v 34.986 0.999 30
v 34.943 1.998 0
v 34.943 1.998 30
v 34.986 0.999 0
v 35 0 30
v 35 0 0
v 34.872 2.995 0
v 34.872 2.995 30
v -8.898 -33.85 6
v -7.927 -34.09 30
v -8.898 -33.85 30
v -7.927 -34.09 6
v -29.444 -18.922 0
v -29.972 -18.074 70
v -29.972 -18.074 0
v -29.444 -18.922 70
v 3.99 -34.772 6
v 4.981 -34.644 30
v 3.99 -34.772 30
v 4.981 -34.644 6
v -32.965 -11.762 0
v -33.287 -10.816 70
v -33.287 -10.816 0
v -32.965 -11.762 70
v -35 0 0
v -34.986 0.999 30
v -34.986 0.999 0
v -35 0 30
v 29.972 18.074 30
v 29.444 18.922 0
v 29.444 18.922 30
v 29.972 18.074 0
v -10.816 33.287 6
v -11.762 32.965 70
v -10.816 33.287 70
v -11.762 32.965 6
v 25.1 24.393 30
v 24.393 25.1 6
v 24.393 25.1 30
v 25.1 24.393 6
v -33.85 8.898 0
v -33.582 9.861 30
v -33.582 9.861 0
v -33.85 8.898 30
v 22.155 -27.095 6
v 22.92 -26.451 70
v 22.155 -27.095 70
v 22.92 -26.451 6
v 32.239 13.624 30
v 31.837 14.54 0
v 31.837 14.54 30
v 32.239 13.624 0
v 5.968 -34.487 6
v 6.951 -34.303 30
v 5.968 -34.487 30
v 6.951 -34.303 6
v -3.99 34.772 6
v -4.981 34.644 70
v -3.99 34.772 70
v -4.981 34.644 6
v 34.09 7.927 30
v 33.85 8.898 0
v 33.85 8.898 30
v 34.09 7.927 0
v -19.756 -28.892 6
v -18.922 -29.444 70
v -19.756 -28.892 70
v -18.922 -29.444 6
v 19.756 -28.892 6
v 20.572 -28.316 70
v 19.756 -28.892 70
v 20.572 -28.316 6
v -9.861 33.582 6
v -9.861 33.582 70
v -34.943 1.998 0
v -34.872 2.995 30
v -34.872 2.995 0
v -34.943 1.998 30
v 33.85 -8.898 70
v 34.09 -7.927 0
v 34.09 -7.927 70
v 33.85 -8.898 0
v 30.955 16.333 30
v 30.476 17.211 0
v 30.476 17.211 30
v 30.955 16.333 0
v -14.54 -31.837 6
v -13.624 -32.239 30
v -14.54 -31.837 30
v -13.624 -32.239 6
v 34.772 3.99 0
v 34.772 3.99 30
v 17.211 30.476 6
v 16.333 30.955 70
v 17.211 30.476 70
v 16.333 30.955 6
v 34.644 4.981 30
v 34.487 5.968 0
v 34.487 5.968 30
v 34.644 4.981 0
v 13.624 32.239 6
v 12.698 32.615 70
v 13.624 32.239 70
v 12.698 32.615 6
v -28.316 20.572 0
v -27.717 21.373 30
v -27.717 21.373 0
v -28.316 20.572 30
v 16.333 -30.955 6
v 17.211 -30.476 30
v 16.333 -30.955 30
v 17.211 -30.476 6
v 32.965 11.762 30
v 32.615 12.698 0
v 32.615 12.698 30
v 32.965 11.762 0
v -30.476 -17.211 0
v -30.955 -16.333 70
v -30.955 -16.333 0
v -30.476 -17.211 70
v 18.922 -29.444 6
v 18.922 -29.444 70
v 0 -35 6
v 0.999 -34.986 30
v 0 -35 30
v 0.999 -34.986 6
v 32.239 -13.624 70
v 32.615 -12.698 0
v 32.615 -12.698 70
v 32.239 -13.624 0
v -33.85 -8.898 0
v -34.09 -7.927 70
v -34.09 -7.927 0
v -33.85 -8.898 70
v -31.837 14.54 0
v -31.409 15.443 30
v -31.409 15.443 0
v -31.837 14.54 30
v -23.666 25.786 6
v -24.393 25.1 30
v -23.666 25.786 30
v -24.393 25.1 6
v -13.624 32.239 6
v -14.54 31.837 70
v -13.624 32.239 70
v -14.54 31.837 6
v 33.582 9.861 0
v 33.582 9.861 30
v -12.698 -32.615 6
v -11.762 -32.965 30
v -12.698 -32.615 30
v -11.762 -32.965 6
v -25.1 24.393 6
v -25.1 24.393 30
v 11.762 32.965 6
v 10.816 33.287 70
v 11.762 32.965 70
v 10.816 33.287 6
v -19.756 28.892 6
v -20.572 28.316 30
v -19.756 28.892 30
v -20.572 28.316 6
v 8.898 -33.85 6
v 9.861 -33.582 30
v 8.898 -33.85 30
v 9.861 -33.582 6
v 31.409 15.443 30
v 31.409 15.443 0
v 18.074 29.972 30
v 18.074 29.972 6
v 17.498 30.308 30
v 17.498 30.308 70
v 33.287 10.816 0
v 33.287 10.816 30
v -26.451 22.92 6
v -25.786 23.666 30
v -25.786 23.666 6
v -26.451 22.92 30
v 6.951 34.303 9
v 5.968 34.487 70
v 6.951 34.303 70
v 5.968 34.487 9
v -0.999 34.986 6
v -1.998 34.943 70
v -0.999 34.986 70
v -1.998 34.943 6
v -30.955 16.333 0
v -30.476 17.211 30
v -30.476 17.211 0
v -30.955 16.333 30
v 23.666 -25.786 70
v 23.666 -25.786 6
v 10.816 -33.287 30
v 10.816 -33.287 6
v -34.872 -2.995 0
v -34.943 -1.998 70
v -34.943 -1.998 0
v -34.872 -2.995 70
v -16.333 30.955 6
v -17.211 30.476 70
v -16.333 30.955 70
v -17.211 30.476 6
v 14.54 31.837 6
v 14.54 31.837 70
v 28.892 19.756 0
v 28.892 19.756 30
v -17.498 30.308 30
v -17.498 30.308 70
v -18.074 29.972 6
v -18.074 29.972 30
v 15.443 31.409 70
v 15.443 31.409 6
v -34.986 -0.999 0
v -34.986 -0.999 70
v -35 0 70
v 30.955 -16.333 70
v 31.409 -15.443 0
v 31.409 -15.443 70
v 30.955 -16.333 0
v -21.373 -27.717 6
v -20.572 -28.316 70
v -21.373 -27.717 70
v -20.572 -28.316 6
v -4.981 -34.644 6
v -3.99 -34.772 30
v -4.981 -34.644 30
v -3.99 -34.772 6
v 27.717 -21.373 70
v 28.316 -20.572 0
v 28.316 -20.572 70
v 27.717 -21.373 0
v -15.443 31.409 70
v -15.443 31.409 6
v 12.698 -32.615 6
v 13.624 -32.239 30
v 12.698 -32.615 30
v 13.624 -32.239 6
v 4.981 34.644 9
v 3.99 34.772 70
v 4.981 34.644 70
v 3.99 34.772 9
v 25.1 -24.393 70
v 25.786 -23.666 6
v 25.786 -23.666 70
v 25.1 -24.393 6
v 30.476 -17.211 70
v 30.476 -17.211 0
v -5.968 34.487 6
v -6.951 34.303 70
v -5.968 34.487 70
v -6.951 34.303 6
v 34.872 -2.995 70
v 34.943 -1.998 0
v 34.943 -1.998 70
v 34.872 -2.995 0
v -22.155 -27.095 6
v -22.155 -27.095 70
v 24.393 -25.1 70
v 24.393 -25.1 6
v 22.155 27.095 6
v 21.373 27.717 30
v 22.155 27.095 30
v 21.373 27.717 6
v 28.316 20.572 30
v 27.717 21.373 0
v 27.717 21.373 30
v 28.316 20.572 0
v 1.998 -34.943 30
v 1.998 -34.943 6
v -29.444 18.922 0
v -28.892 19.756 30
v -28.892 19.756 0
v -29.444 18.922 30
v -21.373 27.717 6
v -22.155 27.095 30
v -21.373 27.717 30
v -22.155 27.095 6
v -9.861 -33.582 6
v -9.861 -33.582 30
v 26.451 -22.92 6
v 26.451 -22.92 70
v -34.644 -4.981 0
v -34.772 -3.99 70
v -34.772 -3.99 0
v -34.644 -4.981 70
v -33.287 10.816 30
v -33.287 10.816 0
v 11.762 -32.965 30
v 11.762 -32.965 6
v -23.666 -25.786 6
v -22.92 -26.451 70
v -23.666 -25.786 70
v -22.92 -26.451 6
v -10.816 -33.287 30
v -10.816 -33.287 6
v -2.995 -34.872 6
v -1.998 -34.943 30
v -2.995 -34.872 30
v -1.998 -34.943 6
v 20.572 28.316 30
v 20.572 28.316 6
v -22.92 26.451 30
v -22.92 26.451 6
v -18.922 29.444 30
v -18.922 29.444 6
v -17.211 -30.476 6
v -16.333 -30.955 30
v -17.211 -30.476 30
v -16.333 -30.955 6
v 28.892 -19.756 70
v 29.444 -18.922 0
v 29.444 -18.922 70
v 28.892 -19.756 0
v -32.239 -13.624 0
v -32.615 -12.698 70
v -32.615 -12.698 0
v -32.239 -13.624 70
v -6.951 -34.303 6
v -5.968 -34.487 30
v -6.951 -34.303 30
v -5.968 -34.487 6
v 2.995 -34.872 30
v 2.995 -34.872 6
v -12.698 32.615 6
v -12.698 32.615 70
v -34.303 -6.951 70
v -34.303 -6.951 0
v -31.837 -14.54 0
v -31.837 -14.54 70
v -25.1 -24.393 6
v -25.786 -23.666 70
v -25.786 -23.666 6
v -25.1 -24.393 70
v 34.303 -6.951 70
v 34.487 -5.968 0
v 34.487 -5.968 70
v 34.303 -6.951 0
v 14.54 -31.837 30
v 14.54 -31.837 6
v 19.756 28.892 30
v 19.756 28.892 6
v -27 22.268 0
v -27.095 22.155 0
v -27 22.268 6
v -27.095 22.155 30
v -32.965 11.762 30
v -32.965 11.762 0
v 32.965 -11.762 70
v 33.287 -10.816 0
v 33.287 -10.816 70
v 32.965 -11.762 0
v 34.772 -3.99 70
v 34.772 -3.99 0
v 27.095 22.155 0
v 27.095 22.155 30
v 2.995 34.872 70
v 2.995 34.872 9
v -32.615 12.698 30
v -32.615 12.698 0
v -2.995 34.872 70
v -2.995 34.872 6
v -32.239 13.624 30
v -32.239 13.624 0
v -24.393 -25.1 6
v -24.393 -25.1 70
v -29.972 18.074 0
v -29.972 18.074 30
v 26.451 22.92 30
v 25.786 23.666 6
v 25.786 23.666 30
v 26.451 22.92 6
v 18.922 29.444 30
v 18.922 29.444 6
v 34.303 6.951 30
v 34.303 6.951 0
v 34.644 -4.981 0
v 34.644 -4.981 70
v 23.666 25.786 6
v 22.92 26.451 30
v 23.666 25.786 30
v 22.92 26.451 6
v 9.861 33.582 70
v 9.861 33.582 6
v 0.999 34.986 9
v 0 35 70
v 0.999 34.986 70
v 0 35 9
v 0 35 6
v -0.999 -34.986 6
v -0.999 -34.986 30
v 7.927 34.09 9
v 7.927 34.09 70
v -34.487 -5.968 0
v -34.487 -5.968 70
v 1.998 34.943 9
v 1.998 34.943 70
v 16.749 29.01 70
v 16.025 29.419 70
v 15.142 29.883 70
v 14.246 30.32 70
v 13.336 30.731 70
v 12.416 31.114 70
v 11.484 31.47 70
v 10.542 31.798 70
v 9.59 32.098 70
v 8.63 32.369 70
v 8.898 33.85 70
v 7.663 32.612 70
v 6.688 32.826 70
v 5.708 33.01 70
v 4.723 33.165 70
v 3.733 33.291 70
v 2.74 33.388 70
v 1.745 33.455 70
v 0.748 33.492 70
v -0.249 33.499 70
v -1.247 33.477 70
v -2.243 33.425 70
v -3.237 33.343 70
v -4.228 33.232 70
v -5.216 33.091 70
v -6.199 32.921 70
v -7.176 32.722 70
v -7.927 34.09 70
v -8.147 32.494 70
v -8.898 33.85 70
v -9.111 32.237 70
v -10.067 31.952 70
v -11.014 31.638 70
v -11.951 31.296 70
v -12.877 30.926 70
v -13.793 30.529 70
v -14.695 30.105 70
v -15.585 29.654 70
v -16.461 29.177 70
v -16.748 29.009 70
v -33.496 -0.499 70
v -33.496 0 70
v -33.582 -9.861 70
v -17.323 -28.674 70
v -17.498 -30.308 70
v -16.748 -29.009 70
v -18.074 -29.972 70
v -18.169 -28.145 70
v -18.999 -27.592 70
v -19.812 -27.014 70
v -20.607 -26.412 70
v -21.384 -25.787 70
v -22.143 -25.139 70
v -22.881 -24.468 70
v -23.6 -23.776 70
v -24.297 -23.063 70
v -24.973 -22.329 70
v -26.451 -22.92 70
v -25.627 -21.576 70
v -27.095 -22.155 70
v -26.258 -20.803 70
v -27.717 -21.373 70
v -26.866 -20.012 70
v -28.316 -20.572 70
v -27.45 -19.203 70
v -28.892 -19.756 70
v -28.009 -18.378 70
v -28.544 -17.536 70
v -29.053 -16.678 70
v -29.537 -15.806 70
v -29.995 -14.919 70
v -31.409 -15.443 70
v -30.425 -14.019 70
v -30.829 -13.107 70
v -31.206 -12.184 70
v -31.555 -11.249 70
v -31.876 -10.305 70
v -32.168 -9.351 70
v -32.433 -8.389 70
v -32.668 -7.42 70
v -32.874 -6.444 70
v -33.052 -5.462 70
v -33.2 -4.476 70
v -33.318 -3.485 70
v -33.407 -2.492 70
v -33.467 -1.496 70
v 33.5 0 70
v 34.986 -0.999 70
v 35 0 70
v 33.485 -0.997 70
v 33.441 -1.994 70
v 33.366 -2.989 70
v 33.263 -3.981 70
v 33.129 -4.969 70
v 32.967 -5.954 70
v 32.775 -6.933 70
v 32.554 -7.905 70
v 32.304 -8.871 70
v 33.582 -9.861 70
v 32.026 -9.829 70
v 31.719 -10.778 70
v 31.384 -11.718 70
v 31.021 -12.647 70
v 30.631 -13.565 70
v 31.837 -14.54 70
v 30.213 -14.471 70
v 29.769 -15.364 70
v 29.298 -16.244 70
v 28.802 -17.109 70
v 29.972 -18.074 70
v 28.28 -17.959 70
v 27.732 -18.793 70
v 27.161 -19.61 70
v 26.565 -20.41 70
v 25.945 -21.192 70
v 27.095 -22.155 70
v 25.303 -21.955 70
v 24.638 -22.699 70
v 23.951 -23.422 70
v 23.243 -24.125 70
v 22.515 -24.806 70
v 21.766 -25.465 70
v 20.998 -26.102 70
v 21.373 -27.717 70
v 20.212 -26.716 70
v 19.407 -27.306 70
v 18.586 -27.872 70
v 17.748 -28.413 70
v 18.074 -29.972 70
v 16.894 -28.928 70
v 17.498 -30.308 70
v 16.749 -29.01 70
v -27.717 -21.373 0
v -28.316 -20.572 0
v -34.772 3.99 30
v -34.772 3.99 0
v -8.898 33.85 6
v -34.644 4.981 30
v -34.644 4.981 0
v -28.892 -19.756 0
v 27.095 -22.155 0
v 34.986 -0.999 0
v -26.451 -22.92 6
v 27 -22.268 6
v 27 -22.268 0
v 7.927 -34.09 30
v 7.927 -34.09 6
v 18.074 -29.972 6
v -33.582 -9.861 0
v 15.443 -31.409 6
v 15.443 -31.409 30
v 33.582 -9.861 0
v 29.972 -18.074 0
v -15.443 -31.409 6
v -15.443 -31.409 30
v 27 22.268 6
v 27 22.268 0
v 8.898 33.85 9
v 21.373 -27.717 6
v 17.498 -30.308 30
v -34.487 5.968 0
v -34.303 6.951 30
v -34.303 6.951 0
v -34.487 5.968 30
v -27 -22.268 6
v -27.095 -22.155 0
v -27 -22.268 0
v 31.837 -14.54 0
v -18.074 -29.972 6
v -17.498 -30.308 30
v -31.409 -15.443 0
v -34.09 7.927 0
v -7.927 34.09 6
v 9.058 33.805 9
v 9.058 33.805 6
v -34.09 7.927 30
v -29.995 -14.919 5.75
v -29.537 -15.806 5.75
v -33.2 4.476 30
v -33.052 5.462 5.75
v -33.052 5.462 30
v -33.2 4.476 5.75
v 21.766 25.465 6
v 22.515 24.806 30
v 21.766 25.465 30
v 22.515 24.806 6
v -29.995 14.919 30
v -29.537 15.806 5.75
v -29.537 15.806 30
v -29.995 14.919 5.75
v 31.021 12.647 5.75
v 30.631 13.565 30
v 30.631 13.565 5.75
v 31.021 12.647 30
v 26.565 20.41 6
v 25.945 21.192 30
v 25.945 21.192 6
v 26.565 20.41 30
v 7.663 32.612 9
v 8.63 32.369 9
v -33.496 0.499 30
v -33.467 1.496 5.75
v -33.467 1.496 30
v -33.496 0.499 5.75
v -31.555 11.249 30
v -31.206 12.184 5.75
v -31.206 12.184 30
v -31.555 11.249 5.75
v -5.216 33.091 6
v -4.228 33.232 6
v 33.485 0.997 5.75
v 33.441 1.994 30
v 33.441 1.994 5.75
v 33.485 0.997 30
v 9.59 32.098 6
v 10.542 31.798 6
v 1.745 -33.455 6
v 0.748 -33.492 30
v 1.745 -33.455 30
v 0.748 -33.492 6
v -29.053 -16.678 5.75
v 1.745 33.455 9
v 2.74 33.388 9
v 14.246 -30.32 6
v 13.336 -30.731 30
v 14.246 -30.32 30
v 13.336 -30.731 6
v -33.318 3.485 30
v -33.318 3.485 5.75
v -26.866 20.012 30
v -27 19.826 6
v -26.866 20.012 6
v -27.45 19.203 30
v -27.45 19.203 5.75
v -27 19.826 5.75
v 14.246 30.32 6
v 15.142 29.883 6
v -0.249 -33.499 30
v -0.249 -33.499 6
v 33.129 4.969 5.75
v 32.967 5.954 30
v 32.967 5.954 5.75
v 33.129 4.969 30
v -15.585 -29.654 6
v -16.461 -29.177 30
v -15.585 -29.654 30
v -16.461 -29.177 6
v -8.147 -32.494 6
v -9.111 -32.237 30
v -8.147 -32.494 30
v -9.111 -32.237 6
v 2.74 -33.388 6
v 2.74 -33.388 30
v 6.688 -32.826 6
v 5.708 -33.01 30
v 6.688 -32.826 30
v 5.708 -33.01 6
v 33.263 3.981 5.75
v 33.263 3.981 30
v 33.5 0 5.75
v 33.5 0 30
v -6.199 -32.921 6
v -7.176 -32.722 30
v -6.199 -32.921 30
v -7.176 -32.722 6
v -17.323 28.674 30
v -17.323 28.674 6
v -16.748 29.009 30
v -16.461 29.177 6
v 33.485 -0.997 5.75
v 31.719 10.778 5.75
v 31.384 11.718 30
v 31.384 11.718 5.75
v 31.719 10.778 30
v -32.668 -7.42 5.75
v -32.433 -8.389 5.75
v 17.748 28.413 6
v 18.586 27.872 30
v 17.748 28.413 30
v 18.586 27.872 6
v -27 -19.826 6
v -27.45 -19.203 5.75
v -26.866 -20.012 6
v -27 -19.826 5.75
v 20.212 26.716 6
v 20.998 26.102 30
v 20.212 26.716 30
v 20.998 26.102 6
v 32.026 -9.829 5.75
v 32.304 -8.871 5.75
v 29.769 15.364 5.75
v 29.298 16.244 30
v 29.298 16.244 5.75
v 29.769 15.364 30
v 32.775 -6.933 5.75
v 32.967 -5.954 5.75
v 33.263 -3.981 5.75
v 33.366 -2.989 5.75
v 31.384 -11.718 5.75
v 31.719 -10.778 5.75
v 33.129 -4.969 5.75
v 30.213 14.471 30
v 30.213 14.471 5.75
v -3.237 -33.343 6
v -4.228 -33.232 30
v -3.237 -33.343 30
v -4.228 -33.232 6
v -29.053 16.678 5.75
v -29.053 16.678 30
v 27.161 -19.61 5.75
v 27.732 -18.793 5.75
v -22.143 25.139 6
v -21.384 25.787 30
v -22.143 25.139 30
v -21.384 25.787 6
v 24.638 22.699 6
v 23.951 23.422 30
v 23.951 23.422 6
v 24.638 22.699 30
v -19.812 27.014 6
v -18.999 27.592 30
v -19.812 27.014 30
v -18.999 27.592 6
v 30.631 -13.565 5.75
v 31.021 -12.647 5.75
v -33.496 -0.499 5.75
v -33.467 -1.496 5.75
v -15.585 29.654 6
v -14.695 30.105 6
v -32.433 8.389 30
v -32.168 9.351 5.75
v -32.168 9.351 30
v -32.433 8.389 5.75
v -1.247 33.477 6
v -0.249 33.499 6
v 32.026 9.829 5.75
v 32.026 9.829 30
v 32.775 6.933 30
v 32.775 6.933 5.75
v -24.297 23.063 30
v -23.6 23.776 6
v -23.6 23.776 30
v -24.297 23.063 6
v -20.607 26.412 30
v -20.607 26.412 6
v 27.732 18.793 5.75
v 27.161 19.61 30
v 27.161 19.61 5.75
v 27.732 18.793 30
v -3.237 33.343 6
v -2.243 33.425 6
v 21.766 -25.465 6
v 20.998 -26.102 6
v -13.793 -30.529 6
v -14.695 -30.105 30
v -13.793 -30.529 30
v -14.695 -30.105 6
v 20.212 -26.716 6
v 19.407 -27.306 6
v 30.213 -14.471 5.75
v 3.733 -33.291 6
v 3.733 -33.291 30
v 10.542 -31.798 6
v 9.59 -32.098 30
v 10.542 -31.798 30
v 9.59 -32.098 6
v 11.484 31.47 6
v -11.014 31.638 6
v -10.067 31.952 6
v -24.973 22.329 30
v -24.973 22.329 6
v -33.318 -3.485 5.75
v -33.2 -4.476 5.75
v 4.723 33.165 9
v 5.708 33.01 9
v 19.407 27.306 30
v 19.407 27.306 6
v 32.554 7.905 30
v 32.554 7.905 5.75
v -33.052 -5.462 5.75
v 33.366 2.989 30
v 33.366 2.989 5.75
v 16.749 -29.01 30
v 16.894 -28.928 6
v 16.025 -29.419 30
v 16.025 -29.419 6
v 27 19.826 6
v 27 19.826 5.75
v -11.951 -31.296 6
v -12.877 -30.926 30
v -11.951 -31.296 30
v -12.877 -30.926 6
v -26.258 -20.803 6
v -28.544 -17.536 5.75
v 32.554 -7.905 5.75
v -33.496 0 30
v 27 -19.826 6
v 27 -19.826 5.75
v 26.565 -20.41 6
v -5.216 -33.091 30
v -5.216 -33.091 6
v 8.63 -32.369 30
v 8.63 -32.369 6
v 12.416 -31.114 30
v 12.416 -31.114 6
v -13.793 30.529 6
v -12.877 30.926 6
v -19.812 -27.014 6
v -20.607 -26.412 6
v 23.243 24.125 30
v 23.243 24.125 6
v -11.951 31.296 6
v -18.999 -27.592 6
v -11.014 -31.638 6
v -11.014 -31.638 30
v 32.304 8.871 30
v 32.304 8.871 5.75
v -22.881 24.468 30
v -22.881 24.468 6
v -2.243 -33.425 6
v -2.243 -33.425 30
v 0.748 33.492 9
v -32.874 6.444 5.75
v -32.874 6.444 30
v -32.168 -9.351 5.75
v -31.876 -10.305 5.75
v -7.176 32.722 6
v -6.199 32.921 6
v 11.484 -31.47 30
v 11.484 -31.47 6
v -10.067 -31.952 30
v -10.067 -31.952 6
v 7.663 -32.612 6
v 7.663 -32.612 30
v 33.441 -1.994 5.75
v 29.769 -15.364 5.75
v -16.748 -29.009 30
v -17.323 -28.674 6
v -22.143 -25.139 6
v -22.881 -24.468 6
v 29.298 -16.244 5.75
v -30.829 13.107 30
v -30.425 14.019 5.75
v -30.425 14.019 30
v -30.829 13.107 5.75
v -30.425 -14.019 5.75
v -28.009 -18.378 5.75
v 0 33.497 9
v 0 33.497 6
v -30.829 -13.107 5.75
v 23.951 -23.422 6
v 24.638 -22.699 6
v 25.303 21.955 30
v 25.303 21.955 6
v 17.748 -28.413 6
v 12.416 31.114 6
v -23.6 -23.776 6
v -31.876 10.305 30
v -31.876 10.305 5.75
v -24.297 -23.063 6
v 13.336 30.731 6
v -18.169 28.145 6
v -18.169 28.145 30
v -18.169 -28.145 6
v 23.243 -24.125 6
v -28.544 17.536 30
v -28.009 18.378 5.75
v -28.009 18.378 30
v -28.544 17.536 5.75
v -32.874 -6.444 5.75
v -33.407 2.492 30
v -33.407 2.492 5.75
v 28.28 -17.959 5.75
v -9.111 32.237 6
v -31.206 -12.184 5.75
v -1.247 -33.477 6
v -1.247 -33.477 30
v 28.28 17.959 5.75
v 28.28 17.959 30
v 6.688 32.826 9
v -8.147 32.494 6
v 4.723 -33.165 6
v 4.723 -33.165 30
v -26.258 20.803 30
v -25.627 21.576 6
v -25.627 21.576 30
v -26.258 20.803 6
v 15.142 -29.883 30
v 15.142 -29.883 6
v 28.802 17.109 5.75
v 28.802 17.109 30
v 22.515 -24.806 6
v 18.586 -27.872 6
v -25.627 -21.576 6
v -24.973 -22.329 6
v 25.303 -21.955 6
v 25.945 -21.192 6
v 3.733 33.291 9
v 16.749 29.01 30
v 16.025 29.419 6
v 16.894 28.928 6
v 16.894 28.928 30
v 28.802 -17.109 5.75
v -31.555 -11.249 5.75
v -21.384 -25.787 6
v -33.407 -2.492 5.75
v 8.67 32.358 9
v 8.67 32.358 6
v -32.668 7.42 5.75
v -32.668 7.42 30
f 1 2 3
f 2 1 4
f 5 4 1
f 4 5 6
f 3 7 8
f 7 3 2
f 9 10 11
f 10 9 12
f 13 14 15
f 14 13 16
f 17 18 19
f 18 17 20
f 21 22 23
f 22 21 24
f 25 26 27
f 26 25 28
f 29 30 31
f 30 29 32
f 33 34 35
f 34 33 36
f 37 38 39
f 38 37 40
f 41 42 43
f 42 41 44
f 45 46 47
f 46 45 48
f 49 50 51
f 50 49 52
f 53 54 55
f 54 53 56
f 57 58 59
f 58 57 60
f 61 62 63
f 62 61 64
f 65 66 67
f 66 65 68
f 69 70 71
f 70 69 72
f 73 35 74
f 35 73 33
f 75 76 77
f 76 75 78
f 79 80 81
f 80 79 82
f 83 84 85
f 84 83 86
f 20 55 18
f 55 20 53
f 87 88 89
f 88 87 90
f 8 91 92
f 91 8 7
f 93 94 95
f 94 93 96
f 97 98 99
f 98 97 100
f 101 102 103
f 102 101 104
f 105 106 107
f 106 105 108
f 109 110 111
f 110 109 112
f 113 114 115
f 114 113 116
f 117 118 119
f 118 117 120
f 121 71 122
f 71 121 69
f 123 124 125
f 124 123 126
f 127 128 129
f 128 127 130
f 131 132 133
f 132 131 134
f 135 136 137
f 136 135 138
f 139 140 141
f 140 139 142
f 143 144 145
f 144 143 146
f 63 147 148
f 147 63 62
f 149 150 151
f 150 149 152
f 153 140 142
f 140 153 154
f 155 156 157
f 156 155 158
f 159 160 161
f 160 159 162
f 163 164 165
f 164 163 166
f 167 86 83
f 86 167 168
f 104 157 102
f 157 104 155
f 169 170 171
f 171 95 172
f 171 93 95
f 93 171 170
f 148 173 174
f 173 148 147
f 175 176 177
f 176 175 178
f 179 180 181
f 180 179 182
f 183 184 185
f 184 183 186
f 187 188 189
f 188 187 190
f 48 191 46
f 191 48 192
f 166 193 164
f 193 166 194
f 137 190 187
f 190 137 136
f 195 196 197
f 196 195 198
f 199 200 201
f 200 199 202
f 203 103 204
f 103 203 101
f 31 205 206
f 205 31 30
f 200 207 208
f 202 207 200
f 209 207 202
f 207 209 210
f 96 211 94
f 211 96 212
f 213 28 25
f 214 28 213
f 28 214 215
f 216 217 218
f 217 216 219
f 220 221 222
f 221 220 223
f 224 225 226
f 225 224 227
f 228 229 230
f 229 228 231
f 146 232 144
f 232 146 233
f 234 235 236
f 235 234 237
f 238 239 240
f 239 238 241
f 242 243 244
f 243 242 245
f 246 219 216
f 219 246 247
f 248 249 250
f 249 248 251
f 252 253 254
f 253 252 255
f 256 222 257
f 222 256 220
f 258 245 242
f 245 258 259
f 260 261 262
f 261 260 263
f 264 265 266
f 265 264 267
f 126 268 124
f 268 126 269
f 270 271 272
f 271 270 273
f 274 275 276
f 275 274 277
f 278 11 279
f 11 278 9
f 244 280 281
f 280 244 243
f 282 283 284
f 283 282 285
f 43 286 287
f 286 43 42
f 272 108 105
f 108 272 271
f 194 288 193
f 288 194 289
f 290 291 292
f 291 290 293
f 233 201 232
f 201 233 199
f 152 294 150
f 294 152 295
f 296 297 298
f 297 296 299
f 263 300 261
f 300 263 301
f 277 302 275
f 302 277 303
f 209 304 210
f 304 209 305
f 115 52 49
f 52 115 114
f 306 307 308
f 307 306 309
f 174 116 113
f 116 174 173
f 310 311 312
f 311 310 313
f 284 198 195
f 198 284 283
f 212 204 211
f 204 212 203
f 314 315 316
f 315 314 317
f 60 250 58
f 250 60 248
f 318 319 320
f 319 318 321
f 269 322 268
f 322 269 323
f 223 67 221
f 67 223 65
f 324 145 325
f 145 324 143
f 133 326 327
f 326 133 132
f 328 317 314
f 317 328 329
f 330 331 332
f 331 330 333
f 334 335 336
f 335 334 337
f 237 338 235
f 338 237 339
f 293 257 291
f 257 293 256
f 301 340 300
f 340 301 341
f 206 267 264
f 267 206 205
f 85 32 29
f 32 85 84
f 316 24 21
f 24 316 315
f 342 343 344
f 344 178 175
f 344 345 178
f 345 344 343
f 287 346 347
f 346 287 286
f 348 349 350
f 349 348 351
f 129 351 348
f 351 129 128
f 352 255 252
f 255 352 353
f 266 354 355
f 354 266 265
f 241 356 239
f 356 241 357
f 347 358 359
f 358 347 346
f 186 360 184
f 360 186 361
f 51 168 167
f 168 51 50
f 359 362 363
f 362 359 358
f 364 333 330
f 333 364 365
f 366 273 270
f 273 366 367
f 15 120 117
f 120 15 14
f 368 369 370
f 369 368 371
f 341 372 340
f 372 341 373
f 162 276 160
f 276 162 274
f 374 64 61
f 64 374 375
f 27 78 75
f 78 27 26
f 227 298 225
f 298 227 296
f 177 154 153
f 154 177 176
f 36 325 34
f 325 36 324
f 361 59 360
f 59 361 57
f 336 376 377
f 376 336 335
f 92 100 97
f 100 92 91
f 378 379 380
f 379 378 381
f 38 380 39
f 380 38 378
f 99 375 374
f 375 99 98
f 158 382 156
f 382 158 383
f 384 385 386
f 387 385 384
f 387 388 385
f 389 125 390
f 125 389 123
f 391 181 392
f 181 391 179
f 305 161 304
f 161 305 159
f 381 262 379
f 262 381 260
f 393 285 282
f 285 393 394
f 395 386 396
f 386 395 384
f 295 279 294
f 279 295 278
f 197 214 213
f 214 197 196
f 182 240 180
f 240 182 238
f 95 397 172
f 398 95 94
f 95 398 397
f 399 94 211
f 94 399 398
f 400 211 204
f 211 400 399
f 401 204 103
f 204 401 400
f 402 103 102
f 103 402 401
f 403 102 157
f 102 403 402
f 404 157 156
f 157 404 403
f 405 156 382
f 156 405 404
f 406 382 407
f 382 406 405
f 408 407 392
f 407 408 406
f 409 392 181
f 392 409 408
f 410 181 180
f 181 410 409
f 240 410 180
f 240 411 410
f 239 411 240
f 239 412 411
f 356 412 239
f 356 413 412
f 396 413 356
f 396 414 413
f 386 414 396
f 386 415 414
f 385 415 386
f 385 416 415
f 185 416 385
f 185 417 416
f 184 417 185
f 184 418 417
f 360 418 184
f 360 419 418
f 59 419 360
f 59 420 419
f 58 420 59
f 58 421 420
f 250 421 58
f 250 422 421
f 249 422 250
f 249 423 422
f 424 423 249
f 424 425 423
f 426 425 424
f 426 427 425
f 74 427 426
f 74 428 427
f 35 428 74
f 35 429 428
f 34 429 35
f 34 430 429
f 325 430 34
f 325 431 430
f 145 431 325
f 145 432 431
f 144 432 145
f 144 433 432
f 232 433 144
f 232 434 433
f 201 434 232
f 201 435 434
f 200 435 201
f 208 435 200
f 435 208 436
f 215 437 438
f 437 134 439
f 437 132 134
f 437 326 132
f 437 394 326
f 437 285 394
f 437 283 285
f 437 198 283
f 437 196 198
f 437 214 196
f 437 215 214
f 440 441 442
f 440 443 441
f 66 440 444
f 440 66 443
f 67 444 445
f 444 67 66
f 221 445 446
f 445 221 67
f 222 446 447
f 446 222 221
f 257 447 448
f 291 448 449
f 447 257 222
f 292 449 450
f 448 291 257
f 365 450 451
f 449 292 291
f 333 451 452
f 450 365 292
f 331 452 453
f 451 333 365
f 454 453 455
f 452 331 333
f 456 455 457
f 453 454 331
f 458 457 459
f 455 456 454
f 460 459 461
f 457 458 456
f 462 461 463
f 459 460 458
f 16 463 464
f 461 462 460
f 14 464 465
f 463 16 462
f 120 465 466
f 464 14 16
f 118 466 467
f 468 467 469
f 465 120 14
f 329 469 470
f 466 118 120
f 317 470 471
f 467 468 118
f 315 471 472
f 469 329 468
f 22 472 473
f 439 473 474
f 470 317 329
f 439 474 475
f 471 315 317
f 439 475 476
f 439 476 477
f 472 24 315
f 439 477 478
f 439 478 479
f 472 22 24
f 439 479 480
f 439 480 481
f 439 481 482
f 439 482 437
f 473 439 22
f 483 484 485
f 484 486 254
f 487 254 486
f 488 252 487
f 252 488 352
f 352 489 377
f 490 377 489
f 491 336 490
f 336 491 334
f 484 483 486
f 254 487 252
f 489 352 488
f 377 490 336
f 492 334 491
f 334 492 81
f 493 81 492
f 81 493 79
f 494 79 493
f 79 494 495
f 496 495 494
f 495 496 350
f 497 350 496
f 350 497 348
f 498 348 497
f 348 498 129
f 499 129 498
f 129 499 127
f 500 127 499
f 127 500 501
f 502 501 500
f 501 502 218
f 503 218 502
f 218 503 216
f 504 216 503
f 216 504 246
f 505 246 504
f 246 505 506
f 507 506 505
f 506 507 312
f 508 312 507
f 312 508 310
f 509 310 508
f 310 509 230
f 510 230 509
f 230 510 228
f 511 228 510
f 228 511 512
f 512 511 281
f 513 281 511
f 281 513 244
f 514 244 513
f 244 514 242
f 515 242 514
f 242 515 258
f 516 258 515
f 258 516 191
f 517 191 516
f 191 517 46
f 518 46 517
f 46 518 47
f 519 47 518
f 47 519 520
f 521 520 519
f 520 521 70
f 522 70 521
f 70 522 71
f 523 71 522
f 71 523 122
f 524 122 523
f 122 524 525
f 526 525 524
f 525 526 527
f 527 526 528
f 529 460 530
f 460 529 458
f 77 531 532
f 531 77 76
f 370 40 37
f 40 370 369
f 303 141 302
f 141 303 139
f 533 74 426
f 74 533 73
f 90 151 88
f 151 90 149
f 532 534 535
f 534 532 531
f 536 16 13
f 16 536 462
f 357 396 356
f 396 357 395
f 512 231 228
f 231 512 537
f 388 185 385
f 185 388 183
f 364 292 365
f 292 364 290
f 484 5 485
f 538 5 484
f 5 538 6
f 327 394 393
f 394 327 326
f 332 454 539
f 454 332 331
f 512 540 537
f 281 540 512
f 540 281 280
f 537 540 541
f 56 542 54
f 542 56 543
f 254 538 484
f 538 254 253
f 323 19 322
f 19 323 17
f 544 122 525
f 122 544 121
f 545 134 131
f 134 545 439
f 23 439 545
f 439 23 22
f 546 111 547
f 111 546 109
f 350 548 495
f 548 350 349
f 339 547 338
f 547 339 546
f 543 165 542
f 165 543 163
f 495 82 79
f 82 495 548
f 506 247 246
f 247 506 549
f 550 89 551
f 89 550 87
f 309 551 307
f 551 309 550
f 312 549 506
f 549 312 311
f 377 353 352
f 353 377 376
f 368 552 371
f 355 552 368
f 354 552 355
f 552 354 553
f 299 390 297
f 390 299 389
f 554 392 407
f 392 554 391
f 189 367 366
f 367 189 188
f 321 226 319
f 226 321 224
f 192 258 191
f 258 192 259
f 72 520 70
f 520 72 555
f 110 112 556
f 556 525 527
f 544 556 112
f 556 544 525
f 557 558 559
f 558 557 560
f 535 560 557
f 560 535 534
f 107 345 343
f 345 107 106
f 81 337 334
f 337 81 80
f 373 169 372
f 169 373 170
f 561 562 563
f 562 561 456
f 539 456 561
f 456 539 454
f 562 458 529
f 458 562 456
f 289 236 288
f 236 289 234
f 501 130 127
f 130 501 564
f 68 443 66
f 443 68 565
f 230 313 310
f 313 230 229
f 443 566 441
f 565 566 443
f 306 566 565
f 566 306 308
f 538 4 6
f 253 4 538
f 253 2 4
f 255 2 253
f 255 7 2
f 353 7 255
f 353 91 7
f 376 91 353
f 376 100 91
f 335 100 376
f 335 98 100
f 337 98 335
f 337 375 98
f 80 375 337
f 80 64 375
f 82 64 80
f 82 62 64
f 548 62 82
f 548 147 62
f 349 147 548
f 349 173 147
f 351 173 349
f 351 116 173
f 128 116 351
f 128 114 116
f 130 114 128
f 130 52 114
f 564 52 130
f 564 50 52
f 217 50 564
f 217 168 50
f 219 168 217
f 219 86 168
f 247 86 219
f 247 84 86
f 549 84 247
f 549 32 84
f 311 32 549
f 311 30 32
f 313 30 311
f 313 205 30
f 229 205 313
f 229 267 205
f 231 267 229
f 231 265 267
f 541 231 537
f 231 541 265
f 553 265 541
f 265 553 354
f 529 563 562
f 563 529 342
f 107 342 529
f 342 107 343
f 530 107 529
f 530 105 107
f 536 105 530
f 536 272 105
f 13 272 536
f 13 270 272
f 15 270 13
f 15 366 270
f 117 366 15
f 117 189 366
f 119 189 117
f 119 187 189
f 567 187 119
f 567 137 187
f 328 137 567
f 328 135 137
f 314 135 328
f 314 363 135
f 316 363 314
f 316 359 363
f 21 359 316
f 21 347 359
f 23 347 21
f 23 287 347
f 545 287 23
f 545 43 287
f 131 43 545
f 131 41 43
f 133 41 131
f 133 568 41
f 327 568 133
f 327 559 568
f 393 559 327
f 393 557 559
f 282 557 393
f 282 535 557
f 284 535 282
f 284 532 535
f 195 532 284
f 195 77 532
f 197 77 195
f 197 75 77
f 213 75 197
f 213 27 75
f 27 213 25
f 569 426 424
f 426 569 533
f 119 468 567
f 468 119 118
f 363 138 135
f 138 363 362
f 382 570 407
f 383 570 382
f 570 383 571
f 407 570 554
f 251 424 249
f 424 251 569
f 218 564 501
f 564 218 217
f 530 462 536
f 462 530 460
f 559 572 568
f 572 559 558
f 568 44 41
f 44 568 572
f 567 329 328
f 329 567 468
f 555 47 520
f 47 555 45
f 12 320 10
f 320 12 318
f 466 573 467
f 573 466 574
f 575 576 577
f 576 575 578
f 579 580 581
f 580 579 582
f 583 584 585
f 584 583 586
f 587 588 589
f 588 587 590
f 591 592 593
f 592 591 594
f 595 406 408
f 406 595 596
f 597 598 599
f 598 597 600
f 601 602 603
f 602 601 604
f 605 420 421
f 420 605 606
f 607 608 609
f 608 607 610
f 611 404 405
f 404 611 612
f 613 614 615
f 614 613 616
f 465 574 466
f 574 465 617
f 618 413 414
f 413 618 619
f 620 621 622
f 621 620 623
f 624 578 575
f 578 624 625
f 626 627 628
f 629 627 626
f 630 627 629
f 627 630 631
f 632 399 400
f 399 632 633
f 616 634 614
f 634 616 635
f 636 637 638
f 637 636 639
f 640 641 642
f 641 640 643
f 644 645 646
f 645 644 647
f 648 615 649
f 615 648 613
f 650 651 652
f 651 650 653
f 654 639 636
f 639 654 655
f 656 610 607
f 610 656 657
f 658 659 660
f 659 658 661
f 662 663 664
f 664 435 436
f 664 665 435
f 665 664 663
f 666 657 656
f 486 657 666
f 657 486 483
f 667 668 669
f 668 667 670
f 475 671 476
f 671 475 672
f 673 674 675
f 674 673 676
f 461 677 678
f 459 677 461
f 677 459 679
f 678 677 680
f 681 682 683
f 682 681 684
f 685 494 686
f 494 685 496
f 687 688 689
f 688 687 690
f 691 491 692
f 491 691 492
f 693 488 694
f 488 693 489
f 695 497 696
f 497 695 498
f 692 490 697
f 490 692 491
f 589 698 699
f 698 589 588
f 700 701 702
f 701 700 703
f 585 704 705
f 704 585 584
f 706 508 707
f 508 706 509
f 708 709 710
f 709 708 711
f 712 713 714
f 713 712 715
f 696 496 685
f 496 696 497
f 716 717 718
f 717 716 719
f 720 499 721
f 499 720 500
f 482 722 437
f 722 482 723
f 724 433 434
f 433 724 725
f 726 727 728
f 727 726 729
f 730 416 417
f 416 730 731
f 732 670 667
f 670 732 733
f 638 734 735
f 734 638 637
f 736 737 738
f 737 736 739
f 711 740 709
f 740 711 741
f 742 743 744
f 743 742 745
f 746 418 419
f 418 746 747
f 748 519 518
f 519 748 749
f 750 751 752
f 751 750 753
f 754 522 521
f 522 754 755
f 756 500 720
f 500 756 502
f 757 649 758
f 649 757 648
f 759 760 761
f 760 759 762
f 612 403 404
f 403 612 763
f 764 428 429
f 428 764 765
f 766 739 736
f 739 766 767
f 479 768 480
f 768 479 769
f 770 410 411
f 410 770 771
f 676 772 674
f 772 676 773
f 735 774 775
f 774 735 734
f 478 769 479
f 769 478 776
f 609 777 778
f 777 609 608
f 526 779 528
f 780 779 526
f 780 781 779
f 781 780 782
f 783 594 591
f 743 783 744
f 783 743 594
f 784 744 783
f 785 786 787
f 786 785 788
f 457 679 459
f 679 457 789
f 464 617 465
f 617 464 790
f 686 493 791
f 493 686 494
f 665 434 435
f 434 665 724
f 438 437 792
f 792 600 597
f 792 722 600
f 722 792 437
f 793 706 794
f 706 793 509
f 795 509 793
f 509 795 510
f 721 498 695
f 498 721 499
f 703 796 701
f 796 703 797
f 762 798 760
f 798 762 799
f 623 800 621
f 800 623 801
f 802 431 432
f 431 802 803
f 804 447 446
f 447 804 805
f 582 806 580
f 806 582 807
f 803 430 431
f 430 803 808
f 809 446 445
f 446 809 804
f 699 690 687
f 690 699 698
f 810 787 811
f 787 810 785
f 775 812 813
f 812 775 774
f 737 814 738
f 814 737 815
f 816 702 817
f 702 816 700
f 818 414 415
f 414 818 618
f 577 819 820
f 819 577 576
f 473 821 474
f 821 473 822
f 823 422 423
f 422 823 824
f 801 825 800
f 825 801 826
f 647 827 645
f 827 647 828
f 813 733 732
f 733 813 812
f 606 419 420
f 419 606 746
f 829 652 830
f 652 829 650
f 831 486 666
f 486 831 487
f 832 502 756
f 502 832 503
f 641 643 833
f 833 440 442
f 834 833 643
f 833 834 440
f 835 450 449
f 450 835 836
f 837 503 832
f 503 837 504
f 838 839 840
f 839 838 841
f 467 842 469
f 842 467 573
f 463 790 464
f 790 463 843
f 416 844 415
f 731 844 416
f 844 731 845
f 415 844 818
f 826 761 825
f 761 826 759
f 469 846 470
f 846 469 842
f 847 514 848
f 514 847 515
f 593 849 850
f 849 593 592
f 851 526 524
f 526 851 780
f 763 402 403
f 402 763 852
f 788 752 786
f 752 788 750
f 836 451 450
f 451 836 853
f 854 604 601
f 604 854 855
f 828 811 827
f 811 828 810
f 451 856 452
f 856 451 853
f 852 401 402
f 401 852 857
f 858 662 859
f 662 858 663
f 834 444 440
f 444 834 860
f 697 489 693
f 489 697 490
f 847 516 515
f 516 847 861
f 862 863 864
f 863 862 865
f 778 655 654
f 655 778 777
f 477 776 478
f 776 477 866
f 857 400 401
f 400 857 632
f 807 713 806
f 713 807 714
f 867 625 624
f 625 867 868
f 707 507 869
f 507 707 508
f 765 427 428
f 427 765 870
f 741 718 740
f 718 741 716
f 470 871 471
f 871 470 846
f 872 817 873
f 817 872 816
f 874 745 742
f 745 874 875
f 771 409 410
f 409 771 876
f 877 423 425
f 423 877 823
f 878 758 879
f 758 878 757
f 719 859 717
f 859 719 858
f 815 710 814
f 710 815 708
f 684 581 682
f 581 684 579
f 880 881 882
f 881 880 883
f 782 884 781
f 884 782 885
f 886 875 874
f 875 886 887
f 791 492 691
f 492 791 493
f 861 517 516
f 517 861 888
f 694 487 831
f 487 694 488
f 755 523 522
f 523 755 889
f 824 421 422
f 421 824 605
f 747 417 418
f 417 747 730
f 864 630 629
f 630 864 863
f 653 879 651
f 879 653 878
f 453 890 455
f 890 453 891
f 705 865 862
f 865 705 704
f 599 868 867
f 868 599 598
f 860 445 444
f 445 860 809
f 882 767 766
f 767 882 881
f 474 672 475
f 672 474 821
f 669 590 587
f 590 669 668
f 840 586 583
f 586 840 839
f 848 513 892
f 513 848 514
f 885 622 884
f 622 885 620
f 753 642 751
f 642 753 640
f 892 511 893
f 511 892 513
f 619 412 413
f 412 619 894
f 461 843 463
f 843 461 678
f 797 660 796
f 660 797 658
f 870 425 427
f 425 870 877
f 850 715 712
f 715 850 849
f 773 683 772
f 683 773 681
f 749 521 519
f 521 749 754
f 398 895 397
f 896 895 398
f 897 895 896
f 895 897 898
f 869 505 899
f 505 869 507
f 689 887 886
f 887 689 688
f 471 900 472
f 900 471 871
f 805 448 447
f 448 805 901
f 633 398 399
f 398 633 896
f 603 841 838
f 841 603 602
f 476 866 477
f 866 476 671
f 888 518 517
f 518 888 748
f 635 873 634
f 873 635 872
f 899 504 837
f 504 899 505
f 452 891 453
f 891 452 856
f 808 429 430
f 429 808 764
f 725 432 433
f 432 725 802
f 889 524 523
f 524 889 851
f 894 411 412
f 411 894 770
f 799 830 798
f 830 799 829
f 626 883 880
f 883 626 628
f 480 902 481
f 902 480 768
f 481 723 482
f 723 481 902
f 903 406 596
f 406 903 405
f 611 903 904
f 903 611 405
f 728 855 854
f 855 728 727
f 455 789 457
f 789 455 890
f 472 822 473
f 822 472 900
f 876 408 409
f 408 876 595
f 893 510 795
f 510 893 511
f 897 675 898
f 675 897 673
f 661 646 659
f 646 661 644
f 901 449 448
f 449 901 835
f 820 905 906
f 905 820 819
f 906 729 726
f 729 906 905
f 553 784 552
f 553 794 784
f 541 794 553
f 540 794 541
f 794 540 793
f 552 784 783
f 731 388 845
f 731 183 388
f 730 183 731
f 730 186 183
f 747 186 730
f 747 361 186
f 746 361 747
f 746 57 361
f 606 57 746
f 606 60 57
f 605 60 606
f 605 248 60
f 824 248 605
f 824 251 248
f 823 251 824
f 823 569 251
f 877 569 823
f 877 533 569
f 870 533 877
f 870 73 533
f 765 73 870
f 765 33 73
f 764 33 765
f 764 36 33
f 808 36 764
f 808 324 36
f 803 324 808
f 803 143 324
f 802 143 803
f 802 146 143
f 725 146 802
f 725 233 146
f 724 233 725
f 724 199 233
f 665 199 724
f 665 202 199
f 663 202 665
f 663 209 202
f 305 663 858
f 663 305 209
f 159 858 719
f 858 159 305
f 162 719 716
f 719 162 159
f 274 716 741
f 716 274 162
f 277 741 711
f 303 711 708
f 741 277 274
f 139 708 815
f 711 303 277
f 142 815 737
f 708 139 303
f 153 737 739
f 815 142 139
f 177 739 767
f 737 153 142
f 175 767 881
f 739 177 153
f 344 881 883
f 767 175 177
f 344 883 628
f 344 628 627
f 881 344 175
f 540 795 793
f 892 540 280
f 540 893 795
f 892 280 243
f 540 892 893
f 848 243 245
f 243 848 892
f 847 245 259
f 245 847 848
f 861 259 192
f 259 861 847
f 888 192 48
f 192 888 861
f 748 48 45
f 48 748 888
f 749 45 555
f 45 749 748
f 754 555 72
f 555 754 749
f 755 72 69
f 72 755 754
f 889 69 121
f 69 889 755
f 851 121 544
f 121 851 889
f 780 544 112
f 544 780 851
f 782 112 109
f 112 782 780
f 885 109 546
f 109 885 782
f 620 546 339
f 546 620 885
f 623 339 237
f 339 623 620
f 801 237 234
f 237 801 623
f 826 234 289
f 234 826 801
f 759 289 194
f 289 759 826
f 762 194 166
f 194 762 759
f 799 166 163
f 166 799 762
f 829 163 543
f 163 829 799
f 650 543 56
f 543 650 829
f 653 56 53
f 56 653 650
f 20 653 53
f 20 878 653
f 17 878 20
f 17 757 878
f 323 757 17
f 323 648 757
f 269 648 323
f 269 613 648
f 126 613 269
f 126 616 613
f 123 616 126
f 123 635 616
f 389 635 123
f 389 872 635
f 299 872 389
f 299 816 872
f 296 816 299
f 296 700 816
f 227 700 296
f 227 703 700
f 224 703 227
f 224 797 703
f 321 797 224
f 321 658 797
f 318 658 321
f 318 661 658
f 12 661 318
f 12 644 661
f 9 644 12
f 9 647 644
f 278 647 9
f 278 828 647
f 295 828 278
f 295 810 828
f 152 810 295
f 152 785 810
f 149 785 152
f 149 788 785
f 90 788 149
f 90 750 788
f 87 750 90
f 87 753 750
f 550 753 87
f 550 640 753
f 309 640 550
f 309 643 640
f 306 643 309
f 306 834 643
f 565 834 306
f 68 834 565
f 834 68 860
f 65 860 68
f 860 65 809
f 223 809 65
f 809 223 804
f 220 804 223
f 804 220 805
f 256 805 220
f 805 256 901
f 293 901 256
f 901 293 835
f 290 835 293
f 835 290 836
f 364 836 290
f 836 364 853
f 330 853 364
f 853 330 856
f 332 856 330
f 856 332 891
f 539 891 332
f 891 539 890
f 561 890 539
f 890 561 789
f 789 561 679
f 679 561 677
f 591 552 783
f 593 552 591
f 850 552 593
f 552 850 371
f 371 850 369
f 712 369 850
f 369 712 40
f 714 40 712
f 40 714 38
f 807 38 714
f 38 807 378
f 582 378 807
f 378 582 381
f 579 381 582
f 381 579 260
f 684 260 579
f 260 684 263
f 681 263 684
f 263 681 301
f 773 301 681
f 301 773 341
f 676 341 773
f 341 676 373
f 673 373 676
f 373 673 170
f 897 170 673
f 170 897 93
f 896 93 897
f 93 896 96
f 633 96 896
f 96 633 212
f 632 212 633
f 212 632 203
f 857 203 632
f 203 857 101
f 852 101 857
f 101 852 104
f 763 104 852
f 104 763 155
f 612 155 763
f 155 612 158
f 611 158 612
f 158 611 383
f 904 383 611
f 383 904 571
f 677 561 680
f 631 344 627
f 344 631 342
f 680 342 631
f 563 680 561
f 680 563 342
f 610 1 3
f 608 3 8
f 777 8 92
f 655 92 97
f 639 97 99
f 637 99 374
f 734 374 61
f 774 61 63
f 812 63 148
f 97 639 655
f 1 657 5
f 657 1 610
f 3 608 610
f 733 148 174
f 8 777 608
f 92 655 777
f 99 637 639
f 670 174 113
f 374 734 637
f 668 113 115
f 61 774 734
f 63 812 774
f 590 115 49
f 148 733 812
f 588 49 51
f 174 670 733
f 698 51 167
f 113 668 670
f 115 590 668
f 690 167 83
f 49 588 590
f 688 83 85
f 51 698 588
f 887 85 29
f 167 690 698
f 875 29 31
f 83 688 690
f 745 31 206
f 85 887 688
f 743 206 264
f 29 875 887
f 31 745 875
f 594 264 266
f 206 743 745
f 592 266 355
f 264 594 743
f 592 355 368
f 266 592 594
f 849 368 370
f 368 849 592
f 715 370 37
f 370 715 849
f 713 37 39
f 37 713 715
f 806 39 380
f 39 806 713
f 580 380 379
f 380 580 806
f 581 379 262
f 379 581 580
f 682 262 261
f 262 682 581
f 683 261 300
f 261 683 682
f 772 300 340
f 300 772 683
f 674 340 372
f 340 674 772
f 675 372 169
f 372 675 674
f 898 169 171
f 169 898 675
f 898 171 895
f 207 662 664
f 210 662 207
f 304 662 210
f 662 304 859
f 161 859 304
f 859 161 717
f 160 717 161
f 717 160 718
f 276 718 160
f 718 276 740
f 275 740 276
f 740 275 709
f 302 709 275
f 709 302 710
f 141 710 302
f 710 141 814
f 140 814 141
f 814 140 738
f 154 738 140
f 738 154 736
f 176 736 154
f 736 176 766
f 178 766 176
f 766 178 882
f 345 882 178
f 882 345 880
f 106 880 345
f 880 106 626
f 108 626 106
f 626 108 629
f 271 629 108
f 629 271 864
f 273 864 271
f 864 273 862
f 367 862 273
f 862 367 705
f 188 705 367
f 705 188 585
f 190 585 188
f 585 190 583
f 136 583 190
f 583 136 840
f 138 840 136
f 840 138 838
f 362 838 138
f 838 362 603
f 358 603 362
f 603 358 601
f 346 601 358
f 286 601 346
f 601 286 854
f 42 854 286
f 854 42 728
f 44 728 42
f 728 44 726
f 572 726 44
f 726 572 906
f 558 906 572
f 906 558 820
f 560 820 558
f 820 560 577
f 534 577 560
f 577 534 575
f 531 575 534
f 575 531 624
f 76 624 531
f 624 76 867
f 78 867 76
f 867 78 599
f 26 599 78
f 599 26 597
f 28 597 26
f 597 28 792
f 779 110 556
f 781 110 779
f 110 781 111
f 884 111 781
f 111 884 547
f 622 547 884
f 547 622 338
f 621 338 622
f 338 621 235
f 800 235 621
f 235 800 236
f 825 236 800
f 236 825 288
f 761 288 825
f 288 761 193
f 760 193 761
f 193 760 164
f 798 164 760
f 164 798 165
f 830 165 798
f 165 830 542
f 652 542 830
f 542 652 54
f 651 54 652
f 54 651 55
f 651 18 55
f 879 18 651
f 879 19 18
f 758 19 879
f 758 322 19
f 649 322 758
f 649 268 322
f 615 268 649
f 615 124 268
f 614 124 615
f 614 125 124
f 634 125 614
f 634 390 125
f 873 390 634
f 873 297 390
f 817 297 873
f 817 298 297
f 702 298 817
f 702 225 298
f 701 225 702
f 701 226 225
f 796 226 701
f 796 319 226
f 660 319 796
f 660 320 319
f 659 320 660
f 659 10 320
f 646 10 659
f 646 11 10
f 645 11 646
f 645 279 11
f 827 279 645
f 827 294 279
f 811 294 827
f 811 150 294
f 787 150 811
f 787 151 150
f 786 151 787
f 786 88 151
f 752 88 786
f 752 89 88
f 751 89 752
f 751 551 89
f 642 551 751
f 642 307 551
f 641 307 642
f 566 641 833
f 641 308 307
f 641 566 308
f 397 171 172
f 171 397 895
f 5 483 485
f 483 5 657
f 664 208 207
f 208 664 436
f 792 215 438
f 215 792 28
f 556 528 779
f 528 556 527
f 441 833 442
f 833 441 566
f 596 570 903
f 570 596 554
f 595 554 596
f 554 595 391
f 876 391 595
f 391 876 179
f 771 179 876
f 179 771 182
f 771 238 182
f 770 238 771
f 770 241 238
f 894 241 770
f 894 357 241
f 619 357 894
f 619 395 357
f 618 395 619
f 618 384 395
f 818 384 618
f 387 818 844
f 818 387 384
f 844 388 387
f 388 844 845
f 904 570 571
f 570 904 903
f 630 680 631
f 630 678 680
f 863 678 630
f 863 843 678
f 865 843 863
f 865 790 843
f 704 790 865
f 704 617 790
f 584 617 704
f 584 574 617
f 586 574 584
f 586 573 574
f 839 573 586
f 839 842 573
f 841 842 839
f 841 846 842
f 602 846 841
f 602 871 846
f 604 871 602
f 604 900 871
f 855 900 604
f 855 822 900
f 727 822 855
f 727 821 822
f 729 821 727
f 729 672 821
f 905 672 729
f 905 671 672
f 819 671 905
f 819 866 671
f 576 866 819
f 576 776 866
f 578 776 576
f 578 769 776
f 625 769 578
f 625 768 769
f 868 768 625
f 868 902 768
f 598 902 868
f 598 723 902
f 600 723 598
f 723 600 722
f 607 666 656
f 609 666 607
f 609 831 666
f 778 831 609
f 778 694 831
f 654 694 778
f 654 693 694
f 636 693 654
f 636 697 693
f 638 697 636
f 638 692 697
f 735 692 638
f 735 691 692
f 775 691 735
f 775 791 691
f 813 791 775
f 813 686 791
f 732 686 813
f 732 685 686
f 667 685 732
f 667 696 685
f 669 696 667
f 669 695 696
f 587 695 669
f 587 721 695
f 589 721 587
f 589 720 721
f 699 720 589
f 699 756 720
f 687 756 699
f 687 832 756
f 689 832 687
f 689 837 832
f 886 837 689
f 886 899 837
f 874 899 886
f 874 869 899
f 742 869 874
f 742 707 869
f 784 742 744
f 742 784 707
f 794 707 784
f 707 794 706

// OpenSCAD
// file: Arc_Module_2.scad
/* Explanation of arc() module (Version_02):
    This module is for creating 2D arcs.

IMPORTANT NOTE: If you've been using Version_01 be aware that some of the paramotor names and their sequence have changed.

	arc(angle or a			= angle of arc, 
        r1 or r or d1 or d  = radius or diameter 1, 
        r2 or d2            = radius or diameter 2 (optional),
		turn				= turns/rotates the arc
        ffn 				= Fixed_Fragments_Number irrespective of angle 
        rfn 				= Round_Fragments_Number to an integer
		info				= echo a reminder of parameters

Parameters:
angle or a:
    Angle of the arc. Value range = [-360 : 360]
    If undefined the default value = 360 
 
r1 or r: 
    Sets the radius of the arc. Alternatively by specifying the variable name "d" or "d1" you can set diameter instead of the radius. 
    If undefined the default radius value = 1 


r2: 
    Gives the option of a second radius to turn the circle section into a ring section. Again by specifying the variable name "d2" you can set diameter instead of the radius
    If undefined the default value = 0  

turn or t:
	Turns/rotates the arc on the Z axis. Inputs can be positive or negative values.      

ffn: Fixed_Fragments_Number (default=OFF)
    Gives the option of setting a fixed number of fragments in the arc, irrespective of the angle size. 
    If ffn = undef it is off, and the fragment number will be calculated by rfn (Round_Fragments_Number) using $fa or $fn, this is the default. 
    

    By default, the number of fragments in the arc is set by $fn or $fa, this value will determine the number of fragments in a full circle. The number of fragments in the arc is proportional to the size of its angle, so, an arc of 180° will have half as many fragments as an arc of 360°. This keeps the fragments as close to a constant size as possible.

    If $fn=undef or $fn=0, which it is by default, the number of figments is set by $fa (minimum angle), which has a default value of 12°.  (360°/12° = 30 figments in a circle)

rfn: Round_Fragments_Number
    The number of fragments has to be an integer, however dividing the angle by $fn will more often than not return a floating-point number which has to be rounded up or down too the nearest whole number.
    If rfn = undef or "down" or 0 it will round down. Rounding down is the default, this is because this will match segments with rotate_extrude.
    If fragRound = "near" or 1 it will round to the nearest integer.
    If fragRound = "up" or 2 it will round up.
	If fragFixed is given a value it will overide fragRound parameter.
   
info: (default=OFF)
	If info = true echo a list of the input parameters to the consol as a reminder of what they are and their order.
*/


//>>>>>>>>>>>>> Call arc module <<<<<<<<<<<<< 

arc(a=270, r1=10, r2=5, t=0, ffn=undef, rfn="near", info=true);


//>>>>>>>>>>>> Declair arc module <<<<<<<<<<<< 
module arc(angle, r1, r2, turn, ffn, rfn, a, r, d1, d2, d, t, info=false){
//warnings
if(		//if r1_ is defined in more than one way
	(is_num(r)  	? 1:0) + 
	(is_num(r1) 	? 1:0) +
	(is_num(d)  	? 1:0) +
	(is_num(d1) 	? 1:0) >1
	||	//if r2_ is defined in more than one way
	(is_num(r2) 	? 1:0) + 
	(is_num(d2) 	? 1:0) >1
	||	//if angle is defined in more than one way
	(is_num(angle) 	? 1:0) +
	(is_num(a)	   	? 1:0) >1
	||	//if turn is defined in more than one way
	(is_num(turn) 	? 1:0) +
	(is_num(t)	   	? 1:0) >1
) 
	echo("WARNING: There is more than one variable describing the same dimention of the arc. Remove redundent variables"); 

a_ = is_num(angle) ? angle :
	 is_num(a)		? a : 360;

//radius 1
// r, r1, d and d1 are all valid inputs to describe the radius. 
// if radius is not input in any valid form it will default to a value of 1 
r1_ = !is_num(r1) && !is_num(r) && !is_num(d1) && !is_num(d)  ? 1  : 
//if d1 is a valid input	
	is_num(d1) ? d1/2  :
//if d is a valid input, if not, r1=0 (if r2 or d2 are valid inputs)
	is_num(d) ? d/2  : 
//if r1 is a valid input	
	is_num(r1) ? r1  :
//if r is a valid input	
	is_num(r) ? r  : 0;

//radius 2
//if d2 is a valid input, if not r2=0 (default)
r2_ = is_num(d2) ? d2/2 :
//if r2 is a valid input
	 is_num(r2) ? r2 : 0;


fragFixed_=	is_num(ffn) ? ffn : undef;

fragRound_ = rfn==undef ? 0 : rfn;

turn_ =	is_num(turn)  	? turn : 
		is_num(t)		? t : 0;

//Prevent the arc from intersecting itsef and make negative angle values positive.
angCap  =  (a_ == undef || a_ >   360) ? 360  : 
           (a_ <  0     && a_ >= -360) ? a_*-1 : 
                           a_ <  -360  ? 360  : a_; 
             
//set number of fragments 
// if number is below a threshold for the angle, apply minimum number of fragments 
frag = min_frag( 
fragFixed_==undef ? ($fn==undef || $fn==0 ? ((360/($fa==undef ? 90:$fa))/360)*angCap : (($fn/360)*angCap)) : fragFixed_);

//Round the number of fragments ether up or down too an intager. min num frag=1
fragNum = fragRound_==undef || fragRound_=="down"|| fragRound_==0 ? (floor(frag)<1?1:floor(frag))://round down (defult)
                              fragRound_=="near" || fragRound_==1 ? (round(frag)<1?1:round(frag))://round  
                              fragRound_=="up"   || fragRound_==2 ?  ceil (frag)://round up 
                                                                  (floor(frag)<1?1:floor(frag));//round down


//number of vectors
l=len(points(r1_));

color("gold")
	rotate([0,0,turn_])
		mirror([0, (a_==undef || a_>0) ? 1 : 0])//flip arc if angle < 0 
			rotate([0,0,-90])
if(((r1_==undef || r1_<=0) && (r2_==undef || r2_<=0)) || r1_==r2_ || angCap==undef || angCap==0 ){
    //The shape has no dimentions so do nothing.
}
else{
    if( r2_==undef || r2_<=0){
    //Outer radeus defined by r1_, No inner radius.
    polygon(concat([for (i=[0:l-1]) points(r1_)[i]], [[0,0]]));
}
else{
    if( r1_==undef || r1_<=0){
    //Outer radeus defined by r2_, No inner radius.
    polygon(concat([for (i=[0:l-1]) points(r2_)[i]], [[0,0]]));
}
else{
    //Inner and outer radiuses
    polygon([for (i=[0:(l*2)-1]) i<l ? points(r1_)[i] : points(r2_)[(l*2)-(i+1)]]);
}
}
}


//FUNCTIONS
//calculate the postion of the points.
function points (r) = [ for (a = [0 : angCap/round(fragNum) : angCap]) [ r * sin(a), r * cos(a) ] ];

//set a minimum number of Number_of_fragments to a given angle size.
function min_frag(fragIn)=
(fragIn==undef || fragIn<3) && angCap>=270 ? 3 :
(fragIn==undef || fragIn<2) && angCap>=180 ? 2 : 
(fragIn==undef || fragIn<1) && angCap>= 90 ? 1 : fragIn;
//(fragIn==undef || fragIn<1) && angCap>=  0 ? 1 : fragIn;

//Info
//will echo a reminder of 
if(info){
	echo("Paramerters of arc() module: ");	
	echo("1:  a = angle of arc, [-360 : 360] ");
	echo("2:  r1 = radius 1, [number]");
	echo("3:  r2 = radius 2, [number]");
	echo("4:  t = turns/rotates the arc [number]");
	echo("5:  ffn = Fixed_Fragments_Number [number]");
	echo("6:  rfn = Round_Fragments_Number [down, near, up] ");
	echo("7:  info = echo a reminder of parameters [false, true] ");
}
}

/* Publication Notes 

arc() Module for OpenSCAD (Version 02) by SavageRodent
https://www.thingiverse.com/thing:5186085
Last updated: 11/06/2024
Published under: the Creative Commons CC - BY 3.0 licence
Licence details here: https://creativecommons.org/licenses/by/3.0/
*/
// main file
use <Arc_Module_2.scad>

$fa=1; // fragment minimum angle 
$fs=1; // fragment minimum size

// MEASURES 

base_thickness = 3;

cup_diameter = 67; // real : 65.6
cup_height = 70;

breadboard_height = 6;
breadboard_width = 54; // real : 53.75

button_diameter = 11.4; // real : 11.35
button_heigth = 4 + base_thickness;

hole_distance = 19;
hole_d = 22;

// CUP MODULES

module CableHole() {
    rotate([0,0,75])
    translate([0,0,breadboard_height-1])
    linear_extrude(height = 4, center = false, twist = 0)
    arc(15, cup_diameter/2 + 2, cup_diameter/2 - 2);
}

module Base() {
    // Button enclosure
    difference() {
        cylinder(h=button_heigth, d=button_diameter + base_thickness, center=false);
        cylinder(h=button_heigth * 3, d=button_diameter, center=true);
    }

    difference() {
    cylinder(h=base_thickness, d=cup_diameter - 0.6);
    union() {
    cylinder(h=base_thickness * 5, d=6, center=true);

    translate([0,-hole_distance,0])
    cylinder(h=base_thickness * 5, d=hole_d, center=true);
        
    translate([0,hole_distance,0])
    cylinder(h=base_thickness * 5, d=hole_d, center=true);

    translate([hole_distance,0,0])
    cylinder(h=base_thickness * 5, d=hole_d, center=true);
        
    translate([-hole_distance,0,0])
    cylinder(h=base_thickness * 5, d=hole_d, center=true);
    }
    }
}

module Cup() {
    difference() {
    difference() {
    difference() {
        // can hold cylinder
        difference() {
            cylinder(h=cup_height, d=cup_diameter + base_thickness, center=false);
            union() {
            cylinder(h=cup_height * 3, d=cup_diameter, center=true);
            }
        }
        // Breadboard enclosure
        cube([breadboard_width, cup_diameter * 2, breadboard_height * 2], center=true);
    }
        translate([0,0,30])
        linear_extrude(height = 70, center = false, twist = 0)
        union(){
            arc(60, cup_diameter/2 + 2, cup_diameter/2 - 2);

            rotate([0,0,120])
            arc(60, cup_diameter/2 + 2, cup_diameter/2 - 2);

            rotate([0,0,-120])
            arc(60, cup_diameter/2 + 2, cup_diameter/2 - 2);
        }
    }
        CableHole();
    }
}
Cup();
difference() {
cylinder(h=breadboard_height - 0.25, d=cup_diameter + base_thickness, center=false);
cube([breadboard_width, cup_diameter * 2, breadboard_height * 2], center=true);
}

// Can holder base
//Base();

// Base Stabilizers
module BaseStabilizer(edge_width, number) {
    angle = 10;
    for ( i = [0 : number] ){
        rotate([0, 0, (360/number) * i + angle/2])
        rotate_extrude(angle=angle)
        translate([cup_diameter/2 - edge_width,breadboard_height + 10 - edge_width,0])
        polygon(points=[[edge_width,edge_width],[edge_width,0],[0,edge_width]],convexity=0);
    }
}
// BaseStabilizer(3, 6);
